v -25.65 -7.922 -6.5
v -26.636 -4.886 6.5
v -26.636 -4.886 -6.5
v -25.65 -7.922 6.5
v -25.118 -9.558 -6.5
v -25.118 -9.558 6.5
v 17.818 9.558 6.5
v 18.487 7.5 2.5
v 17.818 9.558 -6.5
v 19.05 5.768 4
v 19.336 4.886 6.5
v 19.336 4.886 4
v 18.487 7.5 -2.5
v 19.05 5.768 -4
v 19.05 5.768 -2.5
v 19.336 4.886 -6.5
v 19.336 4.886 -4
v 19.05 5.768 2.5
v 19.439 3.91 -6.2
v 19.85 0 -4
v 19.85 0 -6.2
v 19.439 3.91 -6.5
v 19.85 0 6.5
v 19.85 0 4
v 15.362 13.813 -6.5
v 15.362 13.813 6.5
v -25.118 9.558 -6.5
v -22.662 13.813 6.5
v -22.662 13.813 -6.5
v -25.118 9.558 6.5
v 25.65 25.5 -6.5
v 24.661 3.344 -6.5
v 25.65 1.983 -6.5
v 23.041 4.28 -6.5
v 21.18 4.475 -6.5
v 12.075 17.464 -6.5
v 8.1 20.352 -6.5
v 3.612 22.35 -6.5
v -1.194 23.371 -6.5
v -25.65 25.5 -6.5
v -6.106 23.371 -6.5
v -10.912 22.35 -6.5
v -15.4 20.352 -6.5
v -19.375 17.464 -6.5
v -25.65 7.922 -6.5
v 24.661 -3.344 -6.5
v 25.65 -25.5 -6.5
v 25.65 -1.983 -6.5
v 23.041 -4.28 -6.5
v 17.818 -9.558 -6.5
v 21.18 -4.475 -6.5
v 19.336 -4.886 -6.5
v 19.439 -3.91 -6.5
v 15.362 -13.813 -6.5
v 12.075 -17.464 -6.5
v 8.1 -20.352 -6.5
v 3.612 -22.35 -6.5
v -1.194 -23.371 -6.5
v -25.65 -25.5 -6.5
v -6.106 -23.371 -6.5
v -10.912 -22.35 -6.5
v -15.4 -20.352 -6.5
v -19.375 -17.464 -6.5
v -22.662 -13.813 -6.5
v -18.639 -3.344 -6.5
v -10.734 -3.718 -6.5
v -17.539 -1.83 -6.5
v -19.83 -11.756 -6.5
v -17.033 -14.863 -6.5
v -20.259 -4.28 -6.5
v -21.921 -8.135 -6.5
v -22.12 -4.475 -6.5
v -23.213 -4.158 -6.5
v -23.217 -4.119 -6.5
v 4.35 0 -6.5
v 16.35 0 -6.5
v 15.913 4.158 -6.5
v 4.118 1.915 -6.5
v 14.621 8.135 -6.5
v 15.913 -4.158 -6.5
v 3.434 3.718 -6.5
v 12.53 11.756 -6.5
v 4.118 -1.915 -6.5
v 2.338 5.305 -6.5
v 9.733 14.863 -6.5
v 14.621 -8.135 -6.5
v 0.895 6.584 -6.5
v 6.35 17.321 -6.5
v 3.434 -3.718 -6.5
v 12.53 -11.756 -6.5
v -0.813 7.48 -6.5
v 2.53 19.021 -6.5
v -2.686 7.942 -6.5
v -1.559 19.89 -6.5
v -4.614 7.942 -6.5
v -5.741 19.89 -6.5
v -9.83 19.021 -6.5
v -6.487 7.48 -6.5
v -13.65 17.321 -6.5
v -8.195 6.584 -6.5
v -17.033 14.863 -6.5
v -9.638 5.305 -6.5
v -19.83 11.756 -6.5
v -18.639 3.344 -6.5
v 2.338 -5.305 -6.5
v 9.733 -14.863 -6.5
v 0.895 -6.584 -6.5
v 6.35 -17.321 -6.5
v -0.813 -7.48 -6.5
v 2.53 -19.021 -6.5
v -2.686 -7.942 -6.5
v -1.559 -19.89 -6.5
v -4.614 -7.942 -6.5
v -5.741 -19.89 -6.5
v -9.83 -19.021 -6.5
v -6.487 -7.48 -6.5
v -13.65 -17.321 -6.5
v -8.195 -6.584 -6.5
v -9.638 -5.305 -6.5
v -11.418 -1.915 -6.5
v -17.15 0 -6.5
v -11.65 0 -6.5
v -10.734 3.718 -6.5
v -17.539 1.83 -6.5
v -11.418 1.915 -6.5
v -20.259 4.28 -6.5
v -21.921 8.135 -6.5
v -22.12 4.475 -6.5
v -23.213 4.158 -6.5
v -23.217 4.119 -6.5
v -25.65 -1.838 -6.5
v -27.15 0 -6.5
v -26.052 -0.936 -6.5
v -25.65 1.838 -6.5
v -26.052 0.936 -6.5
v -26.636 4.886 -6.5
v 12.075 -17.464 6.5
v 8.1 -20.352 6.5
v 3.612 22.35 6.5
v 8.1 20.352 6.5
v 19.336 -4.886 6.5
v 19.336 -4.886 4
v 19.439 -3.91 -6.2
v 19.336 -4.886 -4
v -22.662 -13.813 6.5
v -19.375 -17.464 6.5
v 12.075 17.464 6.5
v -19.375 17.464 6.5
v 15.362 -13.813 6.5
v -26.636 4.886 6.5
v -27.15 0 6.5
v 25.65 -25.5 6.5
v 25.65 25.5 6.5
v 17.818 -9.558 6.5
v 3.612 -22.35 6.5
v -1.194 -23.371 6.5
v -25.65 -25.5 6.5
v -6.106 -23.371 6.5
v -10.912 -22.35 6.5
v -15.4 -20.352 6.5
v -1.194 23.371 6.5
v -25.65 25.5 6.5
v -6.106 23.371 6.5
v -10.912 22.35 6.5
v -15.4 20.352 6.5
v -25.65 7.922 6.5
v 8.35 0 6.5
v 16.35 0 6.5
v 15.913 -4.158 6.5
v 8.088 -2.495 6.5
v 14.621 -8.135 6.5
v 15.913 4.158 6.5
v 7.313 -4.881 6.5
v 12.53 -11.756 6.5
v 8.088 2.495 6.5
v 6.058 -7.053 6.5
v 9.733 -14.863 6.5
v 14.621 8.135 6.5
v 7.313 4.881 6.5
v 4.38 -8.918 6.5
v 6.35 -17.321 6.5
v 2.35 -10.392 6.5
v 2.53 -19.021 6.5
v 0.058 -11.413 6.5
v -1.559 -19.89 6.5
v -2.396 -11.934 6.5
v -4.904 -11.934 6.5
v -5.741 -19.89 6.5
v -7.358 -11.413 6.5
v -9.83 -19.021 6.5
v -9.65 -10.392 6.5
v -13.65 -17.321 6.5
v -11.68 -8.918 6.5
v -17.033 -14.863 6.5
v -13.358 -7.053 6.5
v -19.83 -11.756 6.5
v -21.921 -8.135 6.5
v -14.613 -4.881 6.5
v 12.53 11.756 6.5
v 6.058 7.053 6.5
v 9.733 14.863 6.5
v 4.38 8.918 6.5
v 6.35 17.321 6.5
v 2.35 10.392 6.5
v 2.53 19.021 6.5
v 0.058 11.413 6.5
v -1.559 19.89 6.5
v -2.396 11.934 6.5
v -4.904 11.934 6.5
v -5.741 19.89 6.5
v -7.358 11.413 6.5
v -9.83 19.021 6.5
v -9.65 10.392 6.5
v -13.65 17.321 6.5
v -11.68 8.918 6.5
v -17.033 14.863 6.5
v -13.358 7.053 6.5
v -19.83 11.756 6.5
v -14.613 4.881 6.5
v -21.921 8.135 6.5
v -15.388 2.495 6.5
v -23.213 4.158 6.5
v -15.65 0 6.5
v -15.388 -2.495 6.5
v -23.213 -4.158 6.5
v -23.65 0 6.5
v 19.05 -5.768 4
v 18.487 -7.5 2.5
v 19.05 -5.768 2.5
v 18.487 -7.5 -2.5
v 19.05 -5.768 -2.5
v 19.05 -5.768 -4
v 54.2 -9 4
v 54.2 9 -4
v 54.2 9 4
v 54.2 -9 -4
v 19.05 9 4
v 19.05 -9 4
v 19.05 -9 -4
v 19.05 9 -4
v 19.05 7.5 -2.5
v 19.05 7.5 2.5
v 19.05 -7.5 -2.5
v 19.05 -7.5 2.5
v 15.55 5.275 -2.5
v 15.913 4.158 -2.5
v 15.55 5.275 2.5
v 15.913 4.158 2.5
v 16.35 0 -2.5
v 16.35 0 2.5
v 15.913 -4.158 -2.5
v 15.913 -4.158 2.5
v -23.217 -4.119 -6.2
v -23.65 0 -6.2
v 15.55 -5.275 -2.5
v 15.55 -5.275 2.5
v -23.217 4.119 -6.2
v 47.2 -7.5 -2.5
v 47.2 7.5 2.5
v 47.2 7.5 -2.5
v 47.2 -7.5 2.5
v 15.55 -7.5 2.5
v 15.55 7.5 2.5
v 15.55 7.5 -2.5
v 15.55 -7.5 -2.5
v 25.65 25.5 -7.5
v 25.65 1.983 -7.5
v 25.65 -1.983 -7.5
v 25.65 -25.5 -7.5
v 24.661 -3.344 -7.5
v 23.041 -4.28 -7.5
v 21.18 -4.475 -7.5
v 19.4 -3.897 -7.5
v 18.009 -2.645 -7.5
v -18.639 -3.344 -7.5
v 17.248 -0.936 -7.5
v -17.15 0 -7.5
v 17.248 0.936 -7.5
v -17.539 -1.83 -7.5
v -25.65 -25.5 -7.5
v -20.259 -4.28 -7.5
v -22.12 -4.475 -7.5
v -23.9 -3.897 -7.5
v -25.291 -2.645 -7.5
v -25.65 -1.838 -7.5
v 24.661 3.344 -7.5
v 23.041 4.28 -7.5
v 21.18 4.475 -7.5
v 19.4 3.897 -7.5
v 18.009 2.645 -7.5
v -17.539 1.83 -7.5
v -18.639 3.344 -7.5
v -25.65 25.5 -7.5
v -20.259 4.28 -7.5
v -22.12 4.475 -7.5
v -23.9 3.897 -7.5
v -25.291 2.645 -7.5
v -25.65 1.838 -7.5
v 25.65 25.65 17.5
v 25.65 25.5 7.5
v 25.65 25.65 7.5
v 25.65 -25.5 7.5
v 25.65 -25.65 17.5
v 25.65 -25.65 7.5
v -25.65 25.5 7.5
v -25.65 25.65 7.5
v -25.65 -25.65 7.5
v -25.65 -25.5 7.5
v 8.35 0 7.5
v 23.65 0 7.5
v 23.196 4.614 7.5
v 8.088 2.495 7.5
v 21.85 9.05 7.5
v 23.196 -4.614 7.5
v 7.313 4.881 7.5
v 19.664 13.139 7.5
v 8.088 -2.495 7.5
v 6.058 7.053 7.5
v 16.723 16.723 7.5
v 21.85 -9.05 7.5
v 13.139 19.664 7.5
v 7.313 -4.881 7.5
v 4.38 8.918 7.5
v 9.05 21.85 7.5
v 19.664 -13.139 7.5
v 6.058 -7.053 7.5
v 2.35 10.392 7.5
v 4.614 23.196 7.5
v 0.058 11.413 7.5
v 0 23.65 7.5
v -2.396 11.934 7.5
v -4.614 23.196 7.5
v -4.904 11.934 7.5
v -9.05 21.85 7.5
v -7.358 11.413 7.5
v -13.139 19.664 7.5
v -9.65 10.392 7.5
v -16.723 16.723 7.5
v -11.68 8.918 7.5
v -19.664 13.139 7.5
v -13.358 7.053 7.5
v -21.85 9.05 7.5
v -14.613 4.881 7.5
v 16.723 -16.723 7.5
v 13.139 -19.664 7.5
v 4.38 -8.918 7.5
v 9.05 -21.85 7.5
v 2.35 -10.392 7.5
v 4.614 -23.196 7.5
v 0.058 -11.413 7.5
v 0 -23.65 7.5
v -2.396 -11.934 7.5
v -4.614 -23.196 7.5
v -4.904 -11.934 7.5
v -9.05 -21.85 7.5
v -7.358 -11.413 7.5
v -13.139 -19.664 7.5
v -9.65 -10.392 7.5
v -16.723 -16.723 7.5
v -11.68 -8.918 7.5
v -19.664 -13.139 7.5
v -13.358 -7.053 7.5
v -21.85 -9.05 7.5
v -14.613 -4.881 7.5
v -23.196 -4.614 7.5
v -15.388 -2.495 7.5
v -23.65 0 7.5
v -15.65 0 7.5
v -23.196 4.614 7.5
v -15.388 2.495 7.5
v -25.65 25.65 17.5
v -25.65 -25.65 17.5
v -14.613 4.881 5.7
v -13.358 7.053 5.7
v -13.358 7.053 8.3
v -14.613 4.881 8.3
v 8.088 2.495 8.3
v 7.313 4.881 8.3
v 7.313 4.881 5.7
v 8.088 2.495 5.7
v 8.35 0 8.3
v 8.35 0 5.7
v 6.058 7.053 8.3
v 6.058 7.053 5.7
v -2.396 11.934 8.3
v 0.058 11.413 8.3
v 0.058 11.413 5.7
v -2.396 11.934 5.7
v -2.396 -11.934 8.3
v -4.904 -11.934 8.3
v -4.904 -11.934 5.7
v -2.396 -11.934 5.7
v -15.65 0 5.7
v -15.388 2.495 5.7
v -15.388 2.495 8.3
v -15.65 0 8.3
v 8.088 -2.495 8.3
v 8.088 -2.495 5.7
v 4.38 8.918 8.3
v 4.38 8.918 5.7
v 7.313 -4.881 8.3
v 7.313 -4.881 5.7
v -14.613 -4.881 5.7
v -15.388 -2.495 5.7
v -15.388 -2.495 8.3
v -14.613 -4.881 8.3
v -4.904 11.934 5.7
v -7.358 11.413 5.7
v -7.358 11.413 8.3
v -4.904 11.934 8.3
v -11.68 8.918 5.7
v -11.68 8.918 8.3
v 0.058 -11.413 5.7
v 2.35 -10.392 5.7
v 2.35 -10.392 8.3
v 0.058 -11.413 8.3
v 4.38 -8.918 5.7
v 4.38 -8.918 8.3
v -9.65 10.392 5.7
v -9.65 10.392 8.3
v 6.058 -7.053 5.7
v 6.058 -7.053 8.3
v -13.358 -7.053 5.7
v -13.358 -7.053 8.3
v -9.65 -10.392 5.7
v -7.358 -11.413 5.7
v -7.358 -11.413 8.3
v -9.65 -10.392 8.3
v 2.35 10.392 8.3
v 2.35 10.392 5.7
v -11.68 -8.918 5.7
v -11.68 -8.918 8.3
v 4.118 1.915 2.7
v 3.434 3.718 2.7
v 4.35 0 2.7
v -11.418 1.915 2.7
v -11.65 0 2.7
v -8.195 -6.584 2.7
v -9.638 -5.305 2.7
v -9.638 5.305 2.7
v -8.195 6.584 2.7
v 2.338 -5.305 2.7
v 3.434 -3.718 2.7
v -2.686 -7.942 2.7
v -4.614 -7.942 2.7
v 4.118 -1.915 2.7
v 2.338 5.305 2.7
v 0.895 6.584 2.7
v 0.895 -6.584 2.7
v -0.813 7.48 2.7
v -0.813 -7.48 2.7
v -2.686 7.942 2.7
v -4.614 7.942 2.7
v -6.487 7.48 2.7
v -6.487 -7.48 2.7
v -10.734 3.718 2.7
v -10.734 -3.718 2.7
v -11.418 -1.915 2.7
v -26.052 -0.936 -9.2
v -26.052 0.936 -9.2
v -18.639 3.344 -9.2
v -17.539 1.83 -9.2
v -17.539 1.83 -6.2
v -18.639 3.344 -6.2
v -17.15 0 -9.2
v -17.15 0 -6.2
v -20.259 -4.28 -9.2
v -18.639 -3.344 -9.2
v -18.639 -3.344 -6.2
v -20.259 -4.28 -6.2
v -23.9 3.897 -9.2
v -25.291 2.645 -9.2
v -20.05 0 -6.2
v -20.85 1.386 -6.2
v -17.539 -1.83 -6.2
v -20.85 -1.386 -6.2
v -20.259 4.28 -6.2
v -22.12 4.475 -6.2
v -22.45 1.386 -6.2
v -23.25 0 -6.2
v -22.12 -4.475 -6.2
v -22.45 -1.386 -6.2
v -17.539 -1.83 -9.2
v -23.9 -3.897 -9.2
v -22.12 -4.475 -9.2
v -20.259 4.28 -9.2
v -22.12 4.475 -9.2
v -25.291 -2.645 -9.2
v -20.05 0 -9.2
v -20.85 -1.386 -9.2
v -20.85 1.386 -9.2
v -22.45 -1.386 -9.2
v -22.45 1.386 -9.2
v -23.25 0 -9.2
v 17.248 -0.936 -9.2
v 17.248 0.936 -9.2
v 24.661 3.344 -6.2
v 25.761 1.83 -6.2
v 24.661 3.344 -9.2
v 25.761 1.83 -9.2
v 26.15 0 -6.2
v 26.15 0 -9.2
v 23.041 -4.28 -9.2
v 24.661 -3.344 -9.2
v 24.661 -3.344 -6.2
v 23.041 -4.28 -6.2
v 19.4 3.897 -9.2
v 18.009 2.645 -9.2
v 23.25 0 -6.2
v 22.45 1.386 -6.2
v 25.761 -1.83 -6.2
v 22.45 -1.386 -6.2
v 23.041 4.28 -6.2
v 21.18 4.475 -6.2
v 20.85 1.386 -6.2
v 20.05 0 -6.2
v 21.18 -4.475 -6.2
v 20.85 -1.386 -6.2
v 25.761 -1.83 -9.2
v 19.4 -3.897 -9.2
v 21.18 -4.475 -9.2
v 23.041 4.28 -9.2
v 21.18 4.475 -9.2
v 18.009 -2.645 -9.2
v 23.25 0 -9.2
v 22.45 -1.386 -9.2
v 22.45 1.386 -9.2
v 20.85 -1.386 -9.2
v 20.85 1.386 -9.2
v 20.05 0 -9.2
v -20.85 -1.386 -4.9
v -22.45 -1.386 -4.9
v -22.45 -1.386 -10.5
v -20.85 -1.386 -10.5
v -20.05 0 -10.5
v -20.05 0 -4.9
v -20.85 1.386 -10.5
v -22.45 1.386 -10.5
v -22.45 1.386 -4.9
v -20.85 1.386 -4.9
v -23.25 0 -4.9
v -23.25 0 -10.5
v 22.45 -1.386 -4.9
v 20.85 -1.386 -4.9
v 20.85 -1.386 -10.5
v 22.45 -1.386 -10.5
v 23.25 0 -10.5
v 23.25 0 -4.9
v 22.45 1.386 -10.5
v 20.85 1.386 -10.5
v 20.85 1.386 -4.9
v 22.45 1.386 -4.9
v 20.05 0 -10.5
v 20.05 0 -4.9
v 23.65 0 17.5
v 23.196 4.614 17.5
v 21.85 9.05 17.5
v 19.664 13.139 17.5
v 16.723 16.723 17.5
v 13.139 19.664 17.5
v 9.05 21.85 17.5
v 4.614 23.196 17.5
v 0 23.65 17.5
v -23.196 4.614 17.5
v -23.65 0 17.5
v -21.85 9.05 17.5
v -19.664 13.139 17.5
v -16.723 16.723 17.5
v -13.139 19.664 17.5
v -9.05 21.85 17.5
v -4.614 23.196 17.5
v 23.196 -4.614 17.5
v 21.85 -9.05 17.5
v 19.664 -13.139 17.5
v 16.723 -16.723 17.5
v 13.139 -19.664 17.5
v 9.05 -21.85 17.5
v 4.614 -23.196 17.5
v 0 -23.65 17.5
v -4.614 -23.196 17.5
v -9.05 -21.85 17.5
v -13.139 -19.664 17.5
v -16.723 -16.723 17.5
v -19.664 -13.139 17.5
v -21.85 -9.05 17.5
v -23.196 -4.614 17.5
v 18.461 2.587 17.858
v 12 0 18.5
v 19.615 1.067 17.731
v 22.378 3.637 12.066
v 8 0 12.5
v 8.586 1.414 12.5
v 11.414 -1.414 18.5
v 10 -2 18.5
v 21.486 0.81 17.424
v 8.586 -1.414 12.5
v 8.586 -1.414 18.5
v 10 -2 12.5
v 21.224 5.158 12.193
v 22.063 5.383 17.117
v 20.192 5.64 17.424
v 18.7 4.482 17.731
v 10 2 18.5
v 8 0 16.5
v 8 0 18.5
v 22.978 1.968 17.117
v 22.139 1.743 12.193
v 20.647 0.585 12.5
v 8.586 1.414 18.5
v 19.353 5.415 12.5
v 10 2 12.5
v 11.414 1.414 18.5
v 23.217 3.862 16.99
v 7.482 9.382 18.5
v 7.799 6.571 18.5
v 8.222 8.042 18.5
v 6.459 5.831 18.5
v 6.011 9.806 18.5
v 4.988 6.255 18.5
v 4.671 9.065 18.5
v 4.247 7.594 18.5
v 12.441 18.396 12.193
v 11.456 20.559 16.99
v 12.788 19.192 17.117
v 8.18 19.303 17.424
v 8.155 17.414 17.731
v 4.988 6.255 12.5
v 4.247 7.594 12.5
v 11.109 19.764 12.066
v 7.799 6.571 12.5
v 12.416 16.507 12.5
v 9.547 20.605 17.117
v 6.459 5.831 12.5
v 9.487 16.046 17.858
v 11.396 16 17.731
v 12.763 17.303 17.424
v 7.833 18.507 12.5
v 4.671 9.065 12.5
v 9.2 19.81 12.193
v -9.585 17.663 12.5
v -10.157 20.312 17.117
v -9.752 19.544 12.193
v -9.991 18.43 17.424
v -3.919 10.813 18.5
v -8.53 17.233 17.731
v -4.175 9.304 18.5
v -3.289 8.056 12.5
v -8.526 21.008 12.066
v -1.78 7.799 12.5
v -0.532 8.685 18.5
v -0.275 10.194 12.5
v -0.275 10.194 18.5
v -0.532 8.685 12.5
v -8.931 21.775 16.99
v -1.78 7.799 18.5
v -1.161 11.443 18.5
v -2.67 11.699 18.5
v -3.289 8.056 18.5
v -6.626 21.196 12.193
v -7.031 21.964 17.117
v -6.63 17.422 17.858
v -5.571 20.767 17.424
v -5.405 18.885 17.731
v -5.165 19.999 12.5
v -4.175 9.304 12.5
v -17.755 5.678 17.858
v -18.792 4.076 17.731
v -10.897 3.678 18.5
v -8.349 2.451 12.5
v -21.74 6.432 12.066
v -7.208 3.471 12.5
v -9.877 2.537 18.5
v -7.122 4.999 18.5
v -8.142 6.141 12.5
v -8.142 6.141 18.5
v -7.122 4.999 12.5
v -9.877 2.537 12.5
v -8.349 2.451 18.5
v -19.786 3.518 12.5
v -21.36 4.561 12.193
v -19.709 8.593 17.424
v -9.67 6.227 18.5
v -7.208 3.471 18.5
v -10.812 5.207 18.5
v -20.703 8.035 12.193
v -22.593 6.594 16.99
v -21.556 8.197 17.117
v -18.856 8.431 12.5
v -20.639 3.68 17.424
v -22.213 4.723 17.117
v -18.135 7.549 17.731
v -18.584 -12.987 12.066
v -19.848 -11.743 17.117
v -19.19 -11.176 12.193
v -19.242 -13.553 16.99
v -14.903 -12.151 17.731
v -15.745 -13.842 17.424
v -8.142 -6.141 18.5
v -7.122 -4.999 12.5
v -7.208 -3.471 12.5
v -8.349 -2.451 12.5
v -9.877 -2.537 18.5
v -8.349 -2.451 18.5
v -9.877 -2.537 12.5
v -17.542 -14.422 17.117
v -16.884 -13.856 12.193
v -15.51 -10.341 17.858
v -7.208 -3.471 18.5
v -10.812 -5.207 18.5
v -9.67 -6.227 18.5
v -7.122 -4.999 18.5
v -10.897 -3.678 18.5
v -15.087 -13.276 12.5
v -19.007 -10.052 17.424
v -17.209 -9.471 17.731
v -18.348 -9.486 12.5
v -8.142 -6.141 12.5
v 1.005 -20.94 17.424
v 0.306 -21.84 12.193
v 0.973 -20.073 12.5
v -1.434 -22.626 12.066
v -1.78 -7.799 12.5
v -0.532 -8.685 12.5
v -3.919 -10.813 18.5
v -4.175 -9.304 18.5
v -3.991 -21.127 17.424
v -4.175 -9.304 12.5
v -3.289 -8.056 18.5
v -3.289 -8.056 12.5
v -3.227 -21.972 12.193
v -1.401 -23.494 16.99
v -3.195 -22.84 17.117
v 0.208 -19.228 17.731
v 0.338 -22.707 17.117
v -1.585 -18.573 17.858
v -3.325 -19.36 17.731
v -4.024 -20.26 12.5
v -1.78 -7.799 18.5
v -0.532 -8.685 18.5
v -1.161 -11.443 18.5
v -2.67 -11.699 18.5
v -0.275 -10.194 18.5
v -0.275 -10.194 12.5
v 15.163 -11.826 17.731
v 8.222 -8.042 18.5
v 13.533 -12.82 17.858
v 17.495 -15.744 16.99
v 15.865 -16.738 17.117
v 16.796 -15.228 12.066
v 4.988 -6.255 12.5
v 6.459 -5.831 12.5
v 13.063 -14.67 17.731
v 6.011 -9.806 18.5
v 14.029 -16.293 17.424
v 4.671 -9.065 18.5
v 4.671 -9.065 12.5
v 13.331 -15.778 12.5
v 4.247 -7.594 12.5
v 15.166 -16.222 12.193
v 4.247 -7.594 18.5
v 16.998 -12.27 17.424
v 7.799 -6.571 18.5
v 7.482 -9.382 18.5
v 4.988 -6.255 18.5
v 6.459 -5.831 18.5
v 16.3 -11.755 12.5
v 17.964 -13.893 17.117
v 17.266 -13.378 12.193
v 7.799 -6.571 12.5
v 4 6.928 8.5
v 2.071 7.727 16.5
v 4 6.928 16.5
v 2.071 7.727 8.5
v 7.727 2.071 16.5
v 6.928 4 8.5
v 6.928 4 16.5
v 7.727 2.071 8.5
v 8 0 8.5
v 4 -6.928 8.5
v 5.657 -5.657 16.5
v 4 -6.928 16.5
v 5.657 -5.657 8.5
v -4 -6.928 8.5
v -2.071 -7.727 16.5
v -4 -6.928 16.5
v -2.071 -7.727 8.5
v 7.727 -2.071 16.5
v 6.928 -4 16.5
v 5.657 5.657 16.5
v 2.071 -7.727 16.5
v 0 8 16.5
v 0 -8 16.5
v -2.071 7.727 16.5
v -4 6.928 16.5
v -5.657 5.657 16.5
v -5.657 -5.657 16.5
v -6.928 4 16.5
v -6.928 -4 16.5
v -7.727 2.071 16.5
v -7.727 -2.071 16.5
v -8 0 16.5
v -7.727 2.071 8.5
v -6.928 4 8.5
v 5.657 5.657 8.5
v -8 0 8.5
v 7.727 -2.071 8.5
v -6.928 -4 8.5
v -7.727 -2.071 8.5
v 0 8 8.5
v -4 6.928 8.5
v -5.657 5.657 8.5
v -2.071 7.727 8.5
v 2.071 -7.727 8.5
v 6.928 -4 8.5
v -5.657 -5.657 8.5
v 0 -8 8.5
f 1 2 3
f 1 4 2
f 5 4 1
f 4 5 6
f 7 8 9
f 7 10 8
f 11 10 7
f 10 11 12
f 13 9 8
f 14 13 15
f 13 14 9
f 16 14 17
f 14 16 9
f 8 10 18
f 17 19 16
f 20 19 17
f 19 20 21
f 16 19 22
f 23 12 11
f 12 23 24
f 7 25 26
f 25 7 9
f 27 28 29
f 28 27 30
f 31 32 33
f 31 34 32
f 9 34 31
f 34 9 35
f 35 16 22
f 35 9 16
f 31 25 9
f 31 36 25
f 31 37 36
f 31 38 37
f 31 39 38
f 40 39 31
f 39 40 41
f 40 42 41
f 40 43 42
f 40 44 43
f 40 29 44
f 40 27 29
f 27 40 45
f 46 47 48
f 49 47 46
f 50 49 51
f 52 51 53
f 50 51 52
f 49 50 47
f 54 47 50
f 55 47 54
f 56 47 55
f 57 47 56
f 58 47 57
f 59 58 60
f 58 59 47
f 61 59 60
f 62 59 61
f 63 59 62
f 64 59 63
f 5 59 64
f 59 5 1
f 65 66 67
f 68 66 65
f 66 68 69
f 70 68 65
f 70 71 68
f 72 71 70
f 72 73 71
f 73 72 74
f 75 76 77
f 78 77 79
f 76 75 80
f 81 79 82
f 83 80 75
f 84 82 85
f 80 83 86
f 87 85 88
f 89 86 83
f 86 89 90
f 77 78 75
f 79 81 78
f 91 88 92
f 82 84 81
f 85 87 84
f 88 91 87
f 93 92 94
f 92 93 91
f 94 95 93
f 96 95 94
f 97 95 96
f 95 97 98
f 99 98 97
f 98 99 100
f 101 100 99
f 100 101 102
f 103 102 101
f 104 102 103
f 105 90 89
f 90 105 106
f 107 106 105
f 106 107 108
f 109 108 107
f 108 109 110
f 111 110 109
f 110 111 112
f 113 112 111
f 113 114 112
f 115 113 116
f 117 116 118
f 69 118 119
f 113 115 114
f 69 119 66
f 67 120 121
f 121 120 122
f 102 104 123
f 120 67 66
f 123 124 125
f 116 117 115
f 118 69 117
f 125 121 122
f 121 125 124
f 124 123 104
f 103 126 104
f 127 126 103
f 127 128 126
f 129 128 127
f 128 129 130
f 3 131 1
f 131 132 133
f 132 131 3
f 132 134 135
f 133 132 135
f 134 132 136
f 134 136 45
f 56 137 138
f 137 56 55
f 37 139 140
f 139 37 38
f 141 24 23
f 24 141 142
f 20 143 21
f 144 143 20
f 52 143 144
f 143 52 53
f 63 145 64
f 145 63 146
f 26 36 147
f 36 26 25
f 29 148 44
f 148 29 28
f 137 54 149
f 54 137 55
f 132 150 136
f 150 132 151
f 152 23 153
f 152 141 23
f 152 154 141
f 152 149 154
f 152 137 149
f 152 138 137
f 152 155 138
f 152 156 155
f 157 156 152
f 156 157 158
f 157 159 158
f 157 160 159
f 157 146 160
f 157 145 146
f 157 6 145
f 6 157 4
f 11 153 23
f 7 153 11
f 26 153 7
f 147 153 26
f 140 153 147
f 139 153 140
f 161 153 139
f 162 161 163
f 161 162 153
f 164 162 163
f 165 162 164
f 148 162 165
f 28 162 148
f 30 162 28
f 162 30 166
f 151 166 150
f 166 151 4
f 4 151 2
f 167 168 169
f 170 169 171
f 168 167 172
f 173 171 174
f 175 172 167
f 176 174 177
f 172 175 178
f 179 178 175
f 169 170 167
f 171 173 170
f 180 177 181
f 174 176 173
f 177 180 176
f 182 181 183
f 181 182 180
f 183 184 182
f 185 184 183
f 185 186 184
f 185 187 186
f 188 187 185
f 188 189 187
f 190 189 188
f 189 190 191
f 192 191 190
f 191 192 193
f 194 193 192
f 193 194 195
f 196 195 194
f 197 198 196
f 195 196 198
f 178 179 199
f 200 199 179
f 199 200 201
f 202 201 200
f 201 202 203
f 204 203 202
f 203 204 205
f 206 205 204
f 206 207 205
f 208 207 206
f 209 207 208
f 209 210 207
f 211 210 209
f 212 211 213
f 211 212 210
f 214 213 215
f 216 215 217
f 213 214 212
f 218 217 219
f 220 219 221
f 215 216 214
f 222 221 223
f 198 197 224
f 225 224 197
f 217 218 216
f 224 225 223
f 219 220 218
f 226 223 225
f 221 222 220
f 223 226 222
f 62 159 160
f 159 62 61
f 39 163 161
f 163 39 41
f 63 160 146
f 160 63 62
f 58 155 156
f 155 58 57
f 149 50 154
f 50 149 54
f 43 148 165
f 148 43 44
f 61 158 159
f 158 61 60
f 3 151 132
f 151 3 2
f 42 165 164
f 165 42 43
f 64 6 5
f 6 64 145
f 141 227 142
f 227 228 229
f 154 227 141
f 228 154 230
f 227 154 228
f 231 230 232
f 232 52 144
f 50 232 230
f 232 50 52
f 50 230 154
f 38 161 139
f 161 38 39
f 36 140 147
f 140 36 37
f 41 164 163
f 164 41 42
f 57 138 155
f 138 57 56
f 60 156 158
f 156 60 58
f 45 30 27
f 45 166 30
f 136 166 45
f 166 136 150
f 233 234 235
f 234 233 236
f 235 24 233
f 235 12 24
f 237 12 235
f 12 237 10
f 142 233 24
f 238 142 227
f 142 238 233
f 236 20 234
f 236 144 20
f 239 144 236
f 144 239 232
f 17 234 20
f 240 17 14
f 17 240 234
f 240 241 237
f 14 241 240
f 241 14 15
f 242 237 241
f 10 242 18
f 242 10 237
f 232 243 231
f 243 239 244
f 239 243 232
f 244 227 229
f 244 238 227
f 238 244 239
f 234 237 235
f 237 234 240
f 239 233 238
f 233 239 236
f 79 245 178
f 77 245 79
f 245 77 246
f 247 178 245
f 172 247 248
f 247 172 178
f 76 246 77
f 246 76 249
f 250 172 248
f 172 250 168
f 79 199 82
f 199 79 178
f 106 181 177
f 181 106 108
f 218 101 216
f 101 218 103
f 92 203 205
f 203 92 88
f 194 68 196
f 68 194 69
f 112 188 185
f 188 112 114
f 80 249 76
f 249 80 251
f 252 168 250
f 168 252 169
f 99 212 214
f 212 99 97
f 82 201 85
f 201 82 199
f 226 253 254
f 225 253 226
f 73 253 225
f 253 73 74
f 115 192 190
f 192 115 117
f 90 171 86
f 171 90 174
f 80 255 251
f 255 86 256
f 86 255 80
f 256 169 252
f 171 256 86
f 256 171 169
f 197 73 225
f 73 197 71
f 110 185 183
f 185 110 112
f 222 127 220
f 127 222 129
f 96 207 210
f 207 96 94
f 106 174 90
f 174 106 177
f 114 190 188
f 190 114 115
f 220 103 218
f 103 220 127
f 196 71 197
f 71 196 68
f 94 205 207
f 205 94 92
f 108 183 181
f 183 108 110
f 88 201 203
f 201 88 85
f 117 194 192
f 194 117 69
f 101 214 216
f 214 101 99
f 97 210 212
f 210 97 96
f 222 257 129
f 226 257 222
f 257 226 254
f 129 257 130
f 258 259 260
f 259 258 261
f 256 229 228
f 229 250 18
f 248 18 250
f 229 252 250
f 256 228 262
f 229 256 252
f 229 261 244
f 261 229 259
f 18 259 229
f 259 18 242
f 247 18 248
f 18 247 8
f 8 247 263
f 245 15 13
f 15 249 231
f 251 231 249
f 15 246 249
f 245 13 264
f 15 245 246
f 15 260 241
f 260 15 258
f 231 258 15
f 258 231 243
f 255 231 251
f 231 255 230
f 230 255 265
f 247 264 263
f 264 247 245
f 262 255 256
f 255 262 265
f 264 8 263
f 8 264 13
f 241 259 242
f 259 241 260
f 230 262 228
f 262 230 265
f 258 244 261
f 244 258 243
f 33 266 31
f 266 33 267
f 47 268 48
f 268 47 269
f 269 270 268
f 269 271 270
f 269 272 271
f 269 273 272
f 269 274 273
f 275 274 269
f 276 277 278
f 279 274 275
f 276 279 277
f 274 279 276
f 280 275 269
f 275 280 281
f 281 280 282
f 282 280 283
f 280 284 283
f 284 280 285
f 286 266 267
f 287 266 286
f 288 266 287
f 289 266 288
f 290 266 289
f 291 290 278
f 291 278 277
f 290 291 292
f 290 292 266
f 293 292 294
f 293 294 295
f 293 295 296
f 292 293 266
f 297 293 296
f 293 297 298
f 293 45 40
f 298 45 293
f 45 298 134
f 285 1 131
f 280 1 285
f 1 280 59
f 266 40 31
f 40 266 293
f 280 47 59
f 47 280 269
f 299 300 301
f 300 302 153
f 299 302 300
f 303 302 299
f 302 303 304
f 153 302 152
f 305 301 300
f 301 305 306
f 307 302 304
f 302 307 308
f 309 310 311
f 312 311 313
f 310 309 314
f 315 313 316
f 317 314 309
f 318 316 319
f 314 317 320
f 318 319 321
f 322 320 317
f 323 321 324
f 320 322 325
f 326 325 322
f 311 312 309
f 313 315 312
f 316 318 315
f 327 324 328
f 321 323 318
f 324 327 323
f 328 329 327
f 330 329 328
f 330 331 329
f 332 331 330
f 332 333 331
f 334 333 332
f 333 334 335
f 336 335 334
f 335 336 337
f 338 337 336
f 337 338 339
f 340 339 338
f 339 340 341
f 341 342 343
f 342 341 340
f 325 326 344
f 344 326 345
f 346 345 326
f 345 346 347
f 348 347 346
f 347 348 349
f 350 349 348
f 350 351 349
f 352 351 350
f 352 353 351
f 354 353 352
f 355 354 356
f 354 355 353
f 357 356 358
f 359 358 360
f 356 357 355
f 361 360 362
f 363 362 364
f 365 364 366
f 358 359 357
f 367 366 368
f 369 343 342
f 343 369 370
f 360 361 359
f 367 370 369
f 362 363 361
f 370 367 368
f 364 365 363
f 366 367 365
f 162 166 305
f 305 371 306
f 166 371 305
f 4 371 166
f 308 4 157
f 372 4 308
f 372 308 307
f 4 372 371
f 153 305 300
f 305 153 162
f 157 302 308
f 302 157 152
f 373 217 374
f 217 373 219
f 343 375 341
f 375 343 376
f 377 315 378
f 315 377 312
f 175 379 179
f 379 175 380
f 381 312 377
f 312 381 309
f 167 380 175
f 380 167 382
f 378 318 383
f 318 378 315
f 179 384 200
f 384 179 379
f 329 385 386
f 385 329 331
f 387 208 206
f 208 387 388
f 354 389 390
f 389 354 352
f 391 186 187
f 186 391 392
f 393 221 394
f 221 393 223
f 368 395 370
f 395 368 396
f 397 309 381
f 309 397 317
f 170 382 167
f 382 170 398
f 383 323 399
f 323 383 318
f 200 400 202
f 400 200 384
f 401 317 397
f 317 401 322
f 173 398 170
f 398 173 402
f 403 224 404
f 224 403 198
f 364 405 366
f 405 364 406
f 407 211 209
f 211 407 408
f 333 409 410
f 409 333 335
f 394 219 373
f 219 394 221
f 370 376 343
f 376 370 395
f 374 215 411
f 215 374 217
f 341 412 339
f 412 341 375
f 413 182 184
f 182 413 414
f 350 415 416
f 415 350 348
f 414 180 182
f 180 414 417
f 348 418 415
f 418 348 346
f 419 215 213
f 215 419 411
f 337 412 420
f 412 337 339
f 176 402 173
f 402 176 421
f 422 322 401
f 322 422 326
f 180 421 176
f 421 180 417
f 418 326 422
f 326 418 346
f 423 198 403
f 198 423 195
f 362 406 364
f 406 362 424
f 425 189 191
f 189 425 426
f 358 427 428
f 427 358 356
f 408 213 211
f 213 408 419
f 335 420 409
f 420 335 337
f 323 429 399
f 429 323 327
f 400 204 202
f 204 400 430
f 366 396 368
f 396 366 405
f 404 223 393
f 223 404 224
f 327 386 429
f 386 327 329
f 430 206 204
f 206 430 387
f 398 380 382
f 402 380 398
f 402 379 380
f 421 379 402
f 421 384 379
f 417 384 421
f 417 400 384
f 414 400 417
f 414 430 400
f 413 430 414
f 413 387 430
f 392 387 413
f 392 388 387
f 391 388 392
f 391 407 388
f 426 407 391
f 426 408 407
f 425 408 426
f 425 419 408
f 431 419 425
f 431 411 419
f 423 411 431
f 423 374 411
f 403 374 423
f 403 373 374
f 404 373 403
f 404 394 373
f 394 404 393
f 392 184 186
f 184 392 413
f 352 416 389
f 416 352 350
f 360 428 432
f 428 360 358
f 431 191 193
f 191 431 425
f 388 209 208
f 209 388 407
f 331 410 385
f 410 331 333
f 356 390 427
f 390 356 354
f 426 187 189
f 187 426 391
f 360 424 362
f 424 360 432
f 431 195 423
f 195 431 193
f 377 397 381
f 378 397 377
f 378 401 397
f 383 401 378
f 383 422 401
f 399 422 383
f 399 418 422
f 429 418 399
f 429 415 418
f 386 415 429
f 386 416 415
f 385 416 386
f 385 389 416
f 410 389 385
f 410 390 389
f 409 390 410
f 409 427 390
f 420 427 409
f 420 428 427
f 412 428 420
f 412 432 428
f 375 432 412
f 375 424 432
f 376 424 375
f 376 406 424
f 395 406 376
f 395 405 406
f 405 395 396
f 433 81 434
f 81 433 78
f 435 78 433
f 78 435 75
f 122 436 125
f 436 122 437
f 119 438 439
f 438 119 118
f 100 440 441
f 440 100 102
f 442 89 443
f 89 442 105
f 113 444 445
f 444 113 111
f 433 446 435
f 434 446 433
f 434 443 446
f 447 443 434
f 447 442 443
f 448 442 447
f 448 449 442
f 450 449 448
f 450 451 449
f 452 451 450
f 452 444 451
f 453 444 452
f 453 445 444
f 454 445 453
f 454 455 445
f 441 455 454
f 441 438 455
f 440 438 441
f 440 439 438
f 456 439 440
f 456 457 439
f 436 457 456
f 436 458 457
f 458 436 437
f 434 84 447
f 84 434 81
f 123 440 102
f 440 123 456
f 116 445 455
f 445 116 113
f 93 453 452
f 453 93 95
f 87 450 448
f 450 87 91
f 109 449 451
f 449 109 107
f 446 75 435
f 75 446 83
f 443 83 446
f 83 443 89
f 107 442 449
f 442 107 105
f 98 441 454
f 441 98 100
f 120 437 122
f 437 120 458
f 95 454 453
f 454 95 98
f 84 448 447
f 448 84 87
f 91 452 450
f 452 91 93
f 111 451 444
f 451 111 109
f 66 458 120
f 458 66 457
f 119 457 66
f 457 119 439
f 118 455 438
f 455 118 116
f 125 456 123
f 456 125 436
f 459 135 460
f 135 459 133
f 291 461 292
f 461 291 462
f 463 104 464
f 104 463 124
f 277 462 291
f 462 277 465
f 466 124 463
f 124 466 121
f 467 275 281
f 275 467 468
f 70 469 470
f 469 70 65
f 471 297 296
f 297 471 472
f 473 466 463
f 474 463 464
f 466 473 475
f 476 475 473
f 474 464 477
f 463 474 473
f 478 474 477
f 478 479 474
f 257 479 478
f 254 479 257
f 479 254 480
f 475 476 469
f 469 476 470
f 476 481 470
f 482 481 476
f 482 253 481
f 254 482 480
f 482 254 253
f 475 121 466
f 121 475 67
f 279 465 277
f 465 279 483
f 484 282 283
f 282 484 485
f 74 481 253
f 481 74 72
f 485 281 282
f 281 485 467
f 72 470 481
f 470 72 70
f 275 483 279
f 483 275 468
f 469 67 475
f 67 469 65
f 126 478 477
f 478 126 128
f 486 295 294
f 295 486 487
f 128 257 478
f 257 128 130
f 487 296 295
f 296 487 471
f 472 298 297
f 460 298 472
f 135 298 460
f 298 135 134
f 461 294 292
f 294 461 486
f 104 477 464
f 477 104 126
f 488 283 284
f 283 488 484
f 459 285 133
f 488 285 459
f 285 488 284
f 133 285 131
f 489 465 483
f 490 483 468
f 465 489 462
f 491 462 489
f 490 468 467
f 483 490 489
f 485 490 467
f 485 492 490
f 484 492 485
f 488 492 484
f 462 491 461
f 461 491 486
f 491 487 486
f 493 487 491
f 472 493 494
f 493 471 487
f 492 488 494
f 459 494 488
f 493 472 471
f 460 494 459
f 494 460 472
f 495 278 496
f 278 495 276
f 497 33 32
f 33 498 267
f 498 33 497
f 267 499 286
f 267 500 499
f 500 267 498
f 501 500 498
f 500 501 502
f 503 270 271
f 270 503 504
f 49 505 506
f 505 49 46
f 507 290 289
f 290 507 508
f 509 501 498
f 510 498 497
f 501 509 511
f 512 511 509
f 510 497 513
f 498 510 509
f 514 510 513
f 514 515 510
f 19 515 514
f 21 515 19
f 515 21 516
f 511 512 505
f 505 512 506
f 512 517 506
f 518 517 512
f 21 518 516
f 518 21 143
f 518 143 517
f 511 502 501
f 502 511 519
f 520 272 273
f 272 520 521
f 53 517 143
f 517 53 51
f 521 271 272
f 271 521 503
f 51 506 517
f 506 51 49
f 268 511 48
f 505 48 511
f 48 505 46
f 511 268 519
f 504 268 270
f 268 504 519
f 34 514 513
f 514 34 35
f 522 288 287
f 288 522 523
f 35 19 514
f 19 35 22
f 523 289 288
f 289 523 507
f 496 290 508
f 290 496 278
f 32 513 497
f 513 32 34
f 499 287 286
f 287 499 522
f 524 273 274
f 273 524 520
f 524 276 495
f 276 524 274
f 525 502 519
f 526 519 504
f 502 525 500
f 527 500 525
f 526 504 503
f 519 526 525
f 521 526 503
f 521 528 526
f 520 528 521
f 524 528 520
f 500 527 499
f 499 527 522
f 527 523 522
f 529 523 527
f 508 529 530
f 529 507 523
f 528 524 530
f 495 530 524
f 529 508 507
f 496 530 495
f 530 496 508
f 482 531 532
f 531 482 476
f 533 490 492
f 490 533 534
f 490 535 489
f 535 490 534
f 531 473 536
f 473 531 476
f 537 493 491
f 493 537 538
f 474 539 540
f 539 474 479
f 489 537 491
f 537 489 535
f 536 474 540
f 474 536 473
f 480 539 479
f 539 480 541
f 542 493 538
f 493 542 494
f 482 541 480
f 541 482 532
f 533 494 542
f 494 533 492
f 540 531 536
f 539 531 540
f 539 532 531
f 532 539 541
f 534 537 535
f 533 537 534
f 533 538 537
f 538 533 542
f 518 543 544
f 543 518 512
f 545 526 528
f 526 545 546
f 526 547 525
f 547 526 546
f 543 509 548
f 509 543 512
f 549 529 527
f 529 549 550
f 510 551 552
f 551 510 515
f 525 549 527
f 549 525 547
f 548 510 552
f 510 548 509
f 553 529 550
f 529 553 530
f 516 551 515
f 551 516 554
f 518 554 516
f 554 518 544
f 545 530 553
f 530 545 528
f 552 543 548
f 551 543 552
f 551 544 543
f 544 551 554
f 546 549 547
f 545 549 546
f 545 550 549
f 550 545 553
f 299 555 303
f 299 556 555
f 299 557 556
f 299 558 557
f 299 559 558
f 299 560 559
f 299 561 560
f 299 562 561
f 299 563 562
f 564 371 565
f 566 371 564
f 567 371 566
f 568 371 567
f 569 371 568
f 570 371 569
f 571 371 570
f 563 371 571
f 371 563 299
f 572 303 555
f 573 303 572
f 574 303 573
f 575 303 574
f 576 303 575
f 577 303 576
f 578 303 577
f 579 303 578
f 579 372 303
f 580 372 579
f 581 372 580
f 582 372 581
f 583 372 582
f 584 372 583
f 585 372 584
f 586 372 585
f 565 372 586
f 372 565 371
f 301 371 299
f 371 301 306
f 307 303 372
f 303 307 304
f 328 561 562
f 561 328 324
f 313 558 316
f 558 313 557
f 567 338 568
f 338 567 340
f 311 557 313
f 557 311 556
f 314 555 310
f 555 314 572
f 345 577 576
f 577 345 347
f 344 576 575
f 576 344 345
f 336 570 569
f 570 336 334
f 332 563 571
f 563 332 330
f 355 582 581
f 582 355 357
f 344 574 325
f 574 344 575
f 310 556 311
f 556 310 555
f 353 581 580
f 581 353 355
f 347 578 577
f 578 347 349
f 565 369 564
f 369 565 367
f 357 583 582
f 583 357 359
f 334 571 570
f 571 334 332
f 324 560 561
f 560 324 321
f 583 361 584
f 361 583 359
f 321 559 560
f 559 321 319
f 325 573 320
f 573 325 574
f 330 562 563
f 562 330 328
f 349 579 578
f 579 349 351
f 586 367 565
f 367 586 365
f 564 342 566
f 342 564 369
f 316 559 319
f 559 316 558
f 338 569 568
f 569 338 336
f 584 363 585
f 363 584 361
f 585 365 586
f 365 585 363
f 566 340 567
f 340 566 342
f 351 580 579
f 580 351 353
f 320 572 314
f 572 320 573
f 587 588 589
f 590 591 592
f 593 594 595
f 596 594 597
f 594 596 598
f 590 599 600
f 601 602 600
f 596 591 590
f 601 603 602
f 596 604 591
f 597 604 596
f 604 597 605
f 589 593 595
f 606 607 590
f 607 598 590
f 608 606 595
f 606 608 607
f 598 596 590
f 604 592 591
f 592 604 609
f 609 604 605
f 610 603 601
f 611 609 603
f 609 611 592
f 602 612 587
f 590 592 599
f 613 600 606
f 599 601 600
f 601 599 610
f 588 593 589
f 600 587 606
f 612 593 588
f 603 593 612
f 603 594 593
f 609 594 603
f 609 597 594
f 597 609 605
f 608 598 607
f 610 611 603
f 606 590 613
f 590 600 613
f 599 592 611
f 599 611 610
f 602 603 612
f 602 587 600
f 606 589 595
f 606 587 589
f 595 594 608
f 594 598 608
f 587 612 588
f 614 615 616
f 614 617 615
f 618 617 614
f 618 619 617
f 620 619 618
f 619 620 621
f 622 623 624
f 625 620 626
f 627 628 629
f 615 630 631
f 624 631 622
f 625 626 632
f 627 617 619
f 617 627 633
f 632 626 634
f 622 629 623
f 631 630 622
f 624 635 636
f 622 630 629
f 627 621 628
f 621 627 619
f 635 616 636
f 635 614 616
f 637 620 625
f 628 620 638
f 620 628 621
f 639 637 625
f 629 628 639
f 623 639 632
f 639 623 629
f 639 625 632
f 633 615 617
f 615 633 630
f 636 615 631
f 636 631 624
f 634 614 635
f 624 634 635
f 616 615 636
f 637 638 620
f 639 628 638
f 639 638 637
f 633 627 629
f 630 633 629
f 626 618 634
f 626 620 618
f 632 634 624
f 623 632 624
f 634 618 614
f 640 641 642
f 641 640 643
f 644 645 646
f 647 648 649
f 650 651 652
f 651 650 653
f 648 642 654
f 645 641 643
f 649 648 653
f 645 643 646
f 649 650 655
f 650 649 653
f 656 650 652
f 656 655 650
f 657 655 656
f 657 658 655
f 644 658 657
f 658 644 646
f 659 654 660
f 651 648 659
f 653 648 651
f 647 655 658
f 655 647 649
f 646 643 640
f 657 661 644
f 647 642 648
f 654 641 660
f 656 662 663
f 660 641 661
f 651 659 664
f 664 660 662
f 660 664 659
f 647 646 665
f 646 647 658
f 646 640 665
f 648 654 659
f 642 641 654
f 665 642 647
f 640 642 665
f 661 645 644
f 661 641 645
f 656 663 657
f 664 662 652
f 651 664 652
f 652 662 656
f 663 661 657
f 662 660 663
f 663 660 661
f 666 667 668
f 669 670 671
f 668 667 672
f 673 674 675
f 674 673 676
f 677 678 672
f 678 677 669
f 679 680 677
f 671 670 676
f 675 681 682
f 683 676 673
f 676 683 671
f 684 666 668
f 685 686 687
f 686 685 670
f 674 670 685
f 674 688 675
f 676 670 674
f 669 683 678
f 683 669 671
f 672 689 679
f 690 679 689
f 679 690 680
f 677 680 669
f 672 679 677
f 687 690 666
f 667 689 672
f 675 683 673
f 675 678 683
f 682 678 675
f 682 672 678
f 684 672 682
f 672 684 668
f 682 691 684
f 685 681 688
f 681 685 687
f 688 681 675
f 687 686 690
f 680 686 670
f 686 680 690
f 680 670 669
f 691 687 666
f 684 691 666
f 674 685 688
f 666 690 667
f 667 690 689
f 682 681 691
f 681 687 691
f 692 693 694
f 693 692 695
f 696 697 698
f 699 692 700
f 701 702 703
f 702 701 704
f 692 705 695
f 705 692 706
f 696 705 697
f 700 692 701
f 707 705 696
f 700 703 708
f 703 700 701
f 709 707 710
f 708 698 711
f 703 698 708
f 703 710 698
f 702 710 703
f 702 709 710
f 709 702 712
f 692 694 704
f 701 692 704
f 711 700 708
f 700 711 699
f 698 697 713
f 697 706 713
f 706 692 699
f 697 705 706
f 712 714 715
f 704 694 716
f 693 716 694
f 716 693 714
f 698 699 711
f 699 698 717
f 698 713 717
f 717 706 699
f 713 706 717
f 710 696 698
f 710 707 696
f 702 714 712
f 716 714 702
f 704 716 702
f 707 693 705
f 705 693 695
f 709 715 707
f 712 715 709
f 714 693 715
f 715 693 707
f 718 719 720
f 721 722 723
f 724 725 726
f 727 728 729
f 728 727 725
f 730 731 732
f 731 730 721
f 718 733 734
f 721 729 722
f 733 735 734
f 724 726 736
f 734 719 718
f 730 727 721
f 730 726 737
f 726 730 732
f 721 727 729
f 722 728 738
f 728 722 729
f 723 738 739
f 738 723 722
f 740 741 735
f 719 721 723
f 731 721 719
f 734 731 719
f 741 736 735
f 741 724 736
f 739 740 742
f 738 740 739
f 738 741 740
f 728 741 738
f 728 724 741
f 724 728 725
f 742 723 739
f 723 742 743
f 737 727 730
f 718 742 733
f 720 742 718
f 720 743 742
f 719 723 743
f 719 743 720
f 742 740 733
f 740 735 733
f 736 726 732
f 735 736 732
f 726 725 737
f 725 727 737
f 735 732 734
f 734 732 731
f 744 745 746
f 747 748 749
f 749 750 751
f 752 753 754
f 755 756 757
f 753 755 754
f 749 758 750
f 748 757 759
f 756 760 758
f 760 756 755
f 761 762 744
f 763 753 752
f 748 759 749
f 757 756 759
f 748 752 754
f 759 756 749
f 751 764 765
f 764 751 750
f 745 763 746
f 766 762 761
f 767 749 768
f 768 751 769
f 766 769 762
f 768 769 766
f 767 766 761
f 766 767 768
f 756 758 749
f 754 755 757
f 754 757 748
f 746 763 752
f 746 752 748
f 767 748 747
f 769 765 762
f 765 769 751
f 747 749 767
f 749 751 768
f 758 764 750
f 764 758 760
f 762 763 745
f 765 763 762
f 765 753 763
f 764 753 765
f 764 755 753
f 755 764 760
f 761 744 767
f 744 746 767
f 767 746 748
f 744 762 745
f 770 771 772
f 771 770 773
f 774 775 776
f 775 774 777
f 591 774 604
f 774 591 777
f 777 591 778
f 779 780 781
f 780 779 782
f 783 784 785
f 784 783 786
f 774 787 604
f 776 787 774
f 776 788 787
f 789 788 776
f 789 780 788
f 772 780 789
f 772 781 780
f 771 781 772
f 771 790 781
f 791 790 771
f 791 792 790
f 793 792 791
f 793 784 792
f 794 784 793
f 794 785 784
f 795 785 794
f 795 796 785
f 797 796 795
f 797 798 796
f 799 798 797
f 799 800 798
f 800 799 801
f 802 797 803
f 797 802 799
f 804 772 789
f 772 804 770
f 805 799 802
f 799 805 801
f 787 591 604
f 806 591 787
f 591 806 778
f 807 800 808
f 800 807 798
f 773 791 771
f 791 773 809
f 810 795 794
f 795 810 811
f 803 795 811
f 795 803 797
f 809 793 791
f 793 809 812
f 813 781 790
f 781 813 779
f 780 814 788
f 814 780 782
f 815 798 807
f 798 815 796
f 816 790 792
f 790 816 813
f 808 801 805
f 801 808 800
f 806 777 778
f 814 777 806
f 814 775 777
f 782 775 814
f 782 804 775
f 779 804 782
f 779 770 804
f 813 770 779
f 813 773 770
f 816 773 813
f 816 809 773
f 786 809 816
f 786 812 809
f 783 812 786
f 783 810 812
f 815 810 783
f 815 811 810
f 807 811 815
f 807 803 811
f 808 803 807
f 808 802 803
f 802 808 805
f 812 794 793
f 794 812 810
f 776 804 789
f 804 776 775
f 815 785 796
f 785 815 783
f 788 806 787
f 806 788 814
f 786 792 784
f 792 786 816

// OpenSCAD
// Parameters
length_mm = 51.3; //[25.65:102.6:0.1]
width_mm = 51.0; //[25.5:102.0:0.1]
depth_mm = 15.0; //[7.5:30.0:0.1]
wall_thickness_mm = 1.5; //[0.8:3.0:0.1]
top_thickness_mm = 1.0; //[0.5:2.0:0.1]
base_thickness_mm = 1.0; //[0.5:2.0:0.1]
inlet_bore_diameter_mm = 24.0; //[12.0:48.0:0.1]
outlet_width_mm = 18.0; //[9.0:36.0:0.1]
outlet_height_mm = 8.0; //[4.0:16.0:0.1]
outlet_offset_mm = 0.0; //[-10.0:10.0:0.1]
impeller_outer_diameter_mm = 46.0; //[23.0:92.0:0.1]
impeller_hub_diameter_mm = 16.0; //[8.0:32.0:0.1]
impeller_hub_height_mm = 10.0; //[5.0:20.0:0.1]
blade_count = 25; //[10:60:1]
blade_thickness_mm = 0.75; //[0.4:1.5:0.05]
mount_hole_diameter_mm = 3.2; //[2.0:6.0:0.1]
mount_hole_edge_margin_mm = 4.0; //[2.0:8.0:0.1]
eps_mm = 0.8; //[0.2:2.0:0.1]
axis_x_mm = 22.0; //[12.0:30.0:0.1]
axis_y_mm = 25.5; //[18.0:33.0:0.1]
casing_outer_radius_mm = 23.5; //[15.0:30.0:0.1]
casing_inner_radius_mm = 20.0; //[10.0:28.0:0.1]
lug_diameter_mm = 9.0; //[6.0:14.0:0.1]
lug_height_mm = 3.0; //[1.5:6.0:0.1]

// Blower Module
module blower() {
  color("Silver") {
    // Base Plate
    translate([0, 0, -depth_mm/2 + base_thickness_mm/2])
      cube([length_mm, width_mm, base_thickness_mm], center=true);
    
    // Top Cover Plate
    translate([0, 0, depth_mm/2 - top_thickness_mm/2])
      cube([length_mm, width_mm, top_thickness_mm], center=true);
    
    // Blower Casing Volute
    difference() {
      union() {
        translate([-length_mm/2 + axis_x_mm, -width_mm/2 + axis_y_mm, 0])
          cylinder(r=casing_outer_radius_mm, h=depth_mm - top_thickness_mm - base_thickness_mm, center=true);
        translate([(-length_mm/2 + axis_x_mm) + casing_outer_radius_mm + (length_mm/2 - (axis_x_mm - casing_outer_radius_mm) + outlet_height_mm)/2 - eps_mm, outlet_offset_mm, 0])
          cube([length_mm/2 - (axis_x_mm - casing_outer_radius_mm) + outlet_height_mm, outlet_width_mm, outlet_height_mm], center=true);
      }
      translate([-length_mm/2 + axis_x_mm, -width_mm/2 + axis_y_mm, 0])
        cylinder(r=casing_inner_radius_mm, h=depth_mm - top_thickness_mm - base_thickness_mm + 2*eps_mm, center=true);
      translate([(-length_mm/2 + axis_x_mm) + casing_inner_radius_mm + (length_mm/2 - (axis_x_mm - casing_inner_radius_mm) + outlet_height_mm)/2 - eps_mm, outlet_offset_mm, 0])
        cube([length_mm/2 - (axis_x_mm - casing_inner_radius_mm) + outlet_height_mm, outlet_width_mm - 2*wall_thickness_mm, outlet_height_mm - 2*wall_thickness_mm], center=true);
    }
    
    // Inlet Bore Opening
    translate([-length_mm/2 + axis_x_mm, -width_mm/2 + axis_y_mm, depth_mm/2 - top_thickness_mm/2])
      cylinder(r=inlet_bore_diameter_mm/2, h=top_thickness_mm + 2*eps_mm, center=true);
    
    // Motor Hub
    translate([-length_mm/2 + axis_x_mm, -width_mm/2 + axis_y_mm, -depth_mm/2 + base_thickness_mm + impeller_hub_height_mm/2 - eps_mm])
      cylinder(r=impeller_hub_diameter_mm/2, h=impeller_hub_height_mm, center=true);
    
    // Mounting Lugs
    translate([-length_mm/2 + mount_hole_edge_margin_mm, 0, -depth_mm/2 + base_thickness_mm/2 - lug_height_mm/2 + eps_mm])
      cylinder(r=lug_diameter_mm/2, h=lug_height_mm, center=true);
    translate([length_mm/2 - mount_hole_edge_margin_mm, 0, -depth_mm/2 + base_thickness_mm/2 - lug_height_mm/2 + eps_mm])
      cylinder(r=lug_diameter_mm/2, h=lug_height_mm, center=true);
    
    // Mounting Screw Holes
    translate([-length_mm/2 + mount_hole_edge_margin_mm, 0, -depth_mm/2 + base_thickness_mm/2 - lug_height_mm/2 + eps_mm])
      cylinder(r=mount_hole_diameter_mm/2, h=base_thickness_mm + lug_height_mm + 2*eps_mm, center=true);
    translate([length_mm/2 - mount_hole_edge_margin_mm, 0, -depth_mm/2 + base_thickness_mm/2 - lug_height_mm/2 + eps_mm])
      cylinder(r=mount_hole_diameter_mm/2, h=base_thickness_mm + lug_height_mm + 2*eps_mm, center=true);
  }
}

// Fan Module
module fan() {
  color([0.15, 0.15, 0.17]) {
    // Frame
    difference() {
      cube([length_mm, length_mm, 10], center=true);
      cylinder(d=length_mm-4, h=12, center=true, $fn=32);
    }
    // Hub
    cylinder(d=impeller_hub_diameter_mm, h=8, center=true, $fn=24);
    // Blades
    for(i=[0:6]) rotate([0, 0, i*360/7])
      hull() {
        translate([impeller_hub_diameter_mm/2 + 2, 0, 0]) cylinder(r=2, h=6, $fn=8);
        translate([impeller_outer_diameter_mm/2 - 3, 3, 0]) rotate([0, 10, 15]) cylinder(r=2.5, h=5, $fn=8);
      }
  }
}

// Blower Fan Module
module blower_fan() {
  blower();
  translate([0, 0, depth_mm/2 + 5]) fan();
}

// Assembly Module
module assembly() {
  blower_fan();
}

assembly();
